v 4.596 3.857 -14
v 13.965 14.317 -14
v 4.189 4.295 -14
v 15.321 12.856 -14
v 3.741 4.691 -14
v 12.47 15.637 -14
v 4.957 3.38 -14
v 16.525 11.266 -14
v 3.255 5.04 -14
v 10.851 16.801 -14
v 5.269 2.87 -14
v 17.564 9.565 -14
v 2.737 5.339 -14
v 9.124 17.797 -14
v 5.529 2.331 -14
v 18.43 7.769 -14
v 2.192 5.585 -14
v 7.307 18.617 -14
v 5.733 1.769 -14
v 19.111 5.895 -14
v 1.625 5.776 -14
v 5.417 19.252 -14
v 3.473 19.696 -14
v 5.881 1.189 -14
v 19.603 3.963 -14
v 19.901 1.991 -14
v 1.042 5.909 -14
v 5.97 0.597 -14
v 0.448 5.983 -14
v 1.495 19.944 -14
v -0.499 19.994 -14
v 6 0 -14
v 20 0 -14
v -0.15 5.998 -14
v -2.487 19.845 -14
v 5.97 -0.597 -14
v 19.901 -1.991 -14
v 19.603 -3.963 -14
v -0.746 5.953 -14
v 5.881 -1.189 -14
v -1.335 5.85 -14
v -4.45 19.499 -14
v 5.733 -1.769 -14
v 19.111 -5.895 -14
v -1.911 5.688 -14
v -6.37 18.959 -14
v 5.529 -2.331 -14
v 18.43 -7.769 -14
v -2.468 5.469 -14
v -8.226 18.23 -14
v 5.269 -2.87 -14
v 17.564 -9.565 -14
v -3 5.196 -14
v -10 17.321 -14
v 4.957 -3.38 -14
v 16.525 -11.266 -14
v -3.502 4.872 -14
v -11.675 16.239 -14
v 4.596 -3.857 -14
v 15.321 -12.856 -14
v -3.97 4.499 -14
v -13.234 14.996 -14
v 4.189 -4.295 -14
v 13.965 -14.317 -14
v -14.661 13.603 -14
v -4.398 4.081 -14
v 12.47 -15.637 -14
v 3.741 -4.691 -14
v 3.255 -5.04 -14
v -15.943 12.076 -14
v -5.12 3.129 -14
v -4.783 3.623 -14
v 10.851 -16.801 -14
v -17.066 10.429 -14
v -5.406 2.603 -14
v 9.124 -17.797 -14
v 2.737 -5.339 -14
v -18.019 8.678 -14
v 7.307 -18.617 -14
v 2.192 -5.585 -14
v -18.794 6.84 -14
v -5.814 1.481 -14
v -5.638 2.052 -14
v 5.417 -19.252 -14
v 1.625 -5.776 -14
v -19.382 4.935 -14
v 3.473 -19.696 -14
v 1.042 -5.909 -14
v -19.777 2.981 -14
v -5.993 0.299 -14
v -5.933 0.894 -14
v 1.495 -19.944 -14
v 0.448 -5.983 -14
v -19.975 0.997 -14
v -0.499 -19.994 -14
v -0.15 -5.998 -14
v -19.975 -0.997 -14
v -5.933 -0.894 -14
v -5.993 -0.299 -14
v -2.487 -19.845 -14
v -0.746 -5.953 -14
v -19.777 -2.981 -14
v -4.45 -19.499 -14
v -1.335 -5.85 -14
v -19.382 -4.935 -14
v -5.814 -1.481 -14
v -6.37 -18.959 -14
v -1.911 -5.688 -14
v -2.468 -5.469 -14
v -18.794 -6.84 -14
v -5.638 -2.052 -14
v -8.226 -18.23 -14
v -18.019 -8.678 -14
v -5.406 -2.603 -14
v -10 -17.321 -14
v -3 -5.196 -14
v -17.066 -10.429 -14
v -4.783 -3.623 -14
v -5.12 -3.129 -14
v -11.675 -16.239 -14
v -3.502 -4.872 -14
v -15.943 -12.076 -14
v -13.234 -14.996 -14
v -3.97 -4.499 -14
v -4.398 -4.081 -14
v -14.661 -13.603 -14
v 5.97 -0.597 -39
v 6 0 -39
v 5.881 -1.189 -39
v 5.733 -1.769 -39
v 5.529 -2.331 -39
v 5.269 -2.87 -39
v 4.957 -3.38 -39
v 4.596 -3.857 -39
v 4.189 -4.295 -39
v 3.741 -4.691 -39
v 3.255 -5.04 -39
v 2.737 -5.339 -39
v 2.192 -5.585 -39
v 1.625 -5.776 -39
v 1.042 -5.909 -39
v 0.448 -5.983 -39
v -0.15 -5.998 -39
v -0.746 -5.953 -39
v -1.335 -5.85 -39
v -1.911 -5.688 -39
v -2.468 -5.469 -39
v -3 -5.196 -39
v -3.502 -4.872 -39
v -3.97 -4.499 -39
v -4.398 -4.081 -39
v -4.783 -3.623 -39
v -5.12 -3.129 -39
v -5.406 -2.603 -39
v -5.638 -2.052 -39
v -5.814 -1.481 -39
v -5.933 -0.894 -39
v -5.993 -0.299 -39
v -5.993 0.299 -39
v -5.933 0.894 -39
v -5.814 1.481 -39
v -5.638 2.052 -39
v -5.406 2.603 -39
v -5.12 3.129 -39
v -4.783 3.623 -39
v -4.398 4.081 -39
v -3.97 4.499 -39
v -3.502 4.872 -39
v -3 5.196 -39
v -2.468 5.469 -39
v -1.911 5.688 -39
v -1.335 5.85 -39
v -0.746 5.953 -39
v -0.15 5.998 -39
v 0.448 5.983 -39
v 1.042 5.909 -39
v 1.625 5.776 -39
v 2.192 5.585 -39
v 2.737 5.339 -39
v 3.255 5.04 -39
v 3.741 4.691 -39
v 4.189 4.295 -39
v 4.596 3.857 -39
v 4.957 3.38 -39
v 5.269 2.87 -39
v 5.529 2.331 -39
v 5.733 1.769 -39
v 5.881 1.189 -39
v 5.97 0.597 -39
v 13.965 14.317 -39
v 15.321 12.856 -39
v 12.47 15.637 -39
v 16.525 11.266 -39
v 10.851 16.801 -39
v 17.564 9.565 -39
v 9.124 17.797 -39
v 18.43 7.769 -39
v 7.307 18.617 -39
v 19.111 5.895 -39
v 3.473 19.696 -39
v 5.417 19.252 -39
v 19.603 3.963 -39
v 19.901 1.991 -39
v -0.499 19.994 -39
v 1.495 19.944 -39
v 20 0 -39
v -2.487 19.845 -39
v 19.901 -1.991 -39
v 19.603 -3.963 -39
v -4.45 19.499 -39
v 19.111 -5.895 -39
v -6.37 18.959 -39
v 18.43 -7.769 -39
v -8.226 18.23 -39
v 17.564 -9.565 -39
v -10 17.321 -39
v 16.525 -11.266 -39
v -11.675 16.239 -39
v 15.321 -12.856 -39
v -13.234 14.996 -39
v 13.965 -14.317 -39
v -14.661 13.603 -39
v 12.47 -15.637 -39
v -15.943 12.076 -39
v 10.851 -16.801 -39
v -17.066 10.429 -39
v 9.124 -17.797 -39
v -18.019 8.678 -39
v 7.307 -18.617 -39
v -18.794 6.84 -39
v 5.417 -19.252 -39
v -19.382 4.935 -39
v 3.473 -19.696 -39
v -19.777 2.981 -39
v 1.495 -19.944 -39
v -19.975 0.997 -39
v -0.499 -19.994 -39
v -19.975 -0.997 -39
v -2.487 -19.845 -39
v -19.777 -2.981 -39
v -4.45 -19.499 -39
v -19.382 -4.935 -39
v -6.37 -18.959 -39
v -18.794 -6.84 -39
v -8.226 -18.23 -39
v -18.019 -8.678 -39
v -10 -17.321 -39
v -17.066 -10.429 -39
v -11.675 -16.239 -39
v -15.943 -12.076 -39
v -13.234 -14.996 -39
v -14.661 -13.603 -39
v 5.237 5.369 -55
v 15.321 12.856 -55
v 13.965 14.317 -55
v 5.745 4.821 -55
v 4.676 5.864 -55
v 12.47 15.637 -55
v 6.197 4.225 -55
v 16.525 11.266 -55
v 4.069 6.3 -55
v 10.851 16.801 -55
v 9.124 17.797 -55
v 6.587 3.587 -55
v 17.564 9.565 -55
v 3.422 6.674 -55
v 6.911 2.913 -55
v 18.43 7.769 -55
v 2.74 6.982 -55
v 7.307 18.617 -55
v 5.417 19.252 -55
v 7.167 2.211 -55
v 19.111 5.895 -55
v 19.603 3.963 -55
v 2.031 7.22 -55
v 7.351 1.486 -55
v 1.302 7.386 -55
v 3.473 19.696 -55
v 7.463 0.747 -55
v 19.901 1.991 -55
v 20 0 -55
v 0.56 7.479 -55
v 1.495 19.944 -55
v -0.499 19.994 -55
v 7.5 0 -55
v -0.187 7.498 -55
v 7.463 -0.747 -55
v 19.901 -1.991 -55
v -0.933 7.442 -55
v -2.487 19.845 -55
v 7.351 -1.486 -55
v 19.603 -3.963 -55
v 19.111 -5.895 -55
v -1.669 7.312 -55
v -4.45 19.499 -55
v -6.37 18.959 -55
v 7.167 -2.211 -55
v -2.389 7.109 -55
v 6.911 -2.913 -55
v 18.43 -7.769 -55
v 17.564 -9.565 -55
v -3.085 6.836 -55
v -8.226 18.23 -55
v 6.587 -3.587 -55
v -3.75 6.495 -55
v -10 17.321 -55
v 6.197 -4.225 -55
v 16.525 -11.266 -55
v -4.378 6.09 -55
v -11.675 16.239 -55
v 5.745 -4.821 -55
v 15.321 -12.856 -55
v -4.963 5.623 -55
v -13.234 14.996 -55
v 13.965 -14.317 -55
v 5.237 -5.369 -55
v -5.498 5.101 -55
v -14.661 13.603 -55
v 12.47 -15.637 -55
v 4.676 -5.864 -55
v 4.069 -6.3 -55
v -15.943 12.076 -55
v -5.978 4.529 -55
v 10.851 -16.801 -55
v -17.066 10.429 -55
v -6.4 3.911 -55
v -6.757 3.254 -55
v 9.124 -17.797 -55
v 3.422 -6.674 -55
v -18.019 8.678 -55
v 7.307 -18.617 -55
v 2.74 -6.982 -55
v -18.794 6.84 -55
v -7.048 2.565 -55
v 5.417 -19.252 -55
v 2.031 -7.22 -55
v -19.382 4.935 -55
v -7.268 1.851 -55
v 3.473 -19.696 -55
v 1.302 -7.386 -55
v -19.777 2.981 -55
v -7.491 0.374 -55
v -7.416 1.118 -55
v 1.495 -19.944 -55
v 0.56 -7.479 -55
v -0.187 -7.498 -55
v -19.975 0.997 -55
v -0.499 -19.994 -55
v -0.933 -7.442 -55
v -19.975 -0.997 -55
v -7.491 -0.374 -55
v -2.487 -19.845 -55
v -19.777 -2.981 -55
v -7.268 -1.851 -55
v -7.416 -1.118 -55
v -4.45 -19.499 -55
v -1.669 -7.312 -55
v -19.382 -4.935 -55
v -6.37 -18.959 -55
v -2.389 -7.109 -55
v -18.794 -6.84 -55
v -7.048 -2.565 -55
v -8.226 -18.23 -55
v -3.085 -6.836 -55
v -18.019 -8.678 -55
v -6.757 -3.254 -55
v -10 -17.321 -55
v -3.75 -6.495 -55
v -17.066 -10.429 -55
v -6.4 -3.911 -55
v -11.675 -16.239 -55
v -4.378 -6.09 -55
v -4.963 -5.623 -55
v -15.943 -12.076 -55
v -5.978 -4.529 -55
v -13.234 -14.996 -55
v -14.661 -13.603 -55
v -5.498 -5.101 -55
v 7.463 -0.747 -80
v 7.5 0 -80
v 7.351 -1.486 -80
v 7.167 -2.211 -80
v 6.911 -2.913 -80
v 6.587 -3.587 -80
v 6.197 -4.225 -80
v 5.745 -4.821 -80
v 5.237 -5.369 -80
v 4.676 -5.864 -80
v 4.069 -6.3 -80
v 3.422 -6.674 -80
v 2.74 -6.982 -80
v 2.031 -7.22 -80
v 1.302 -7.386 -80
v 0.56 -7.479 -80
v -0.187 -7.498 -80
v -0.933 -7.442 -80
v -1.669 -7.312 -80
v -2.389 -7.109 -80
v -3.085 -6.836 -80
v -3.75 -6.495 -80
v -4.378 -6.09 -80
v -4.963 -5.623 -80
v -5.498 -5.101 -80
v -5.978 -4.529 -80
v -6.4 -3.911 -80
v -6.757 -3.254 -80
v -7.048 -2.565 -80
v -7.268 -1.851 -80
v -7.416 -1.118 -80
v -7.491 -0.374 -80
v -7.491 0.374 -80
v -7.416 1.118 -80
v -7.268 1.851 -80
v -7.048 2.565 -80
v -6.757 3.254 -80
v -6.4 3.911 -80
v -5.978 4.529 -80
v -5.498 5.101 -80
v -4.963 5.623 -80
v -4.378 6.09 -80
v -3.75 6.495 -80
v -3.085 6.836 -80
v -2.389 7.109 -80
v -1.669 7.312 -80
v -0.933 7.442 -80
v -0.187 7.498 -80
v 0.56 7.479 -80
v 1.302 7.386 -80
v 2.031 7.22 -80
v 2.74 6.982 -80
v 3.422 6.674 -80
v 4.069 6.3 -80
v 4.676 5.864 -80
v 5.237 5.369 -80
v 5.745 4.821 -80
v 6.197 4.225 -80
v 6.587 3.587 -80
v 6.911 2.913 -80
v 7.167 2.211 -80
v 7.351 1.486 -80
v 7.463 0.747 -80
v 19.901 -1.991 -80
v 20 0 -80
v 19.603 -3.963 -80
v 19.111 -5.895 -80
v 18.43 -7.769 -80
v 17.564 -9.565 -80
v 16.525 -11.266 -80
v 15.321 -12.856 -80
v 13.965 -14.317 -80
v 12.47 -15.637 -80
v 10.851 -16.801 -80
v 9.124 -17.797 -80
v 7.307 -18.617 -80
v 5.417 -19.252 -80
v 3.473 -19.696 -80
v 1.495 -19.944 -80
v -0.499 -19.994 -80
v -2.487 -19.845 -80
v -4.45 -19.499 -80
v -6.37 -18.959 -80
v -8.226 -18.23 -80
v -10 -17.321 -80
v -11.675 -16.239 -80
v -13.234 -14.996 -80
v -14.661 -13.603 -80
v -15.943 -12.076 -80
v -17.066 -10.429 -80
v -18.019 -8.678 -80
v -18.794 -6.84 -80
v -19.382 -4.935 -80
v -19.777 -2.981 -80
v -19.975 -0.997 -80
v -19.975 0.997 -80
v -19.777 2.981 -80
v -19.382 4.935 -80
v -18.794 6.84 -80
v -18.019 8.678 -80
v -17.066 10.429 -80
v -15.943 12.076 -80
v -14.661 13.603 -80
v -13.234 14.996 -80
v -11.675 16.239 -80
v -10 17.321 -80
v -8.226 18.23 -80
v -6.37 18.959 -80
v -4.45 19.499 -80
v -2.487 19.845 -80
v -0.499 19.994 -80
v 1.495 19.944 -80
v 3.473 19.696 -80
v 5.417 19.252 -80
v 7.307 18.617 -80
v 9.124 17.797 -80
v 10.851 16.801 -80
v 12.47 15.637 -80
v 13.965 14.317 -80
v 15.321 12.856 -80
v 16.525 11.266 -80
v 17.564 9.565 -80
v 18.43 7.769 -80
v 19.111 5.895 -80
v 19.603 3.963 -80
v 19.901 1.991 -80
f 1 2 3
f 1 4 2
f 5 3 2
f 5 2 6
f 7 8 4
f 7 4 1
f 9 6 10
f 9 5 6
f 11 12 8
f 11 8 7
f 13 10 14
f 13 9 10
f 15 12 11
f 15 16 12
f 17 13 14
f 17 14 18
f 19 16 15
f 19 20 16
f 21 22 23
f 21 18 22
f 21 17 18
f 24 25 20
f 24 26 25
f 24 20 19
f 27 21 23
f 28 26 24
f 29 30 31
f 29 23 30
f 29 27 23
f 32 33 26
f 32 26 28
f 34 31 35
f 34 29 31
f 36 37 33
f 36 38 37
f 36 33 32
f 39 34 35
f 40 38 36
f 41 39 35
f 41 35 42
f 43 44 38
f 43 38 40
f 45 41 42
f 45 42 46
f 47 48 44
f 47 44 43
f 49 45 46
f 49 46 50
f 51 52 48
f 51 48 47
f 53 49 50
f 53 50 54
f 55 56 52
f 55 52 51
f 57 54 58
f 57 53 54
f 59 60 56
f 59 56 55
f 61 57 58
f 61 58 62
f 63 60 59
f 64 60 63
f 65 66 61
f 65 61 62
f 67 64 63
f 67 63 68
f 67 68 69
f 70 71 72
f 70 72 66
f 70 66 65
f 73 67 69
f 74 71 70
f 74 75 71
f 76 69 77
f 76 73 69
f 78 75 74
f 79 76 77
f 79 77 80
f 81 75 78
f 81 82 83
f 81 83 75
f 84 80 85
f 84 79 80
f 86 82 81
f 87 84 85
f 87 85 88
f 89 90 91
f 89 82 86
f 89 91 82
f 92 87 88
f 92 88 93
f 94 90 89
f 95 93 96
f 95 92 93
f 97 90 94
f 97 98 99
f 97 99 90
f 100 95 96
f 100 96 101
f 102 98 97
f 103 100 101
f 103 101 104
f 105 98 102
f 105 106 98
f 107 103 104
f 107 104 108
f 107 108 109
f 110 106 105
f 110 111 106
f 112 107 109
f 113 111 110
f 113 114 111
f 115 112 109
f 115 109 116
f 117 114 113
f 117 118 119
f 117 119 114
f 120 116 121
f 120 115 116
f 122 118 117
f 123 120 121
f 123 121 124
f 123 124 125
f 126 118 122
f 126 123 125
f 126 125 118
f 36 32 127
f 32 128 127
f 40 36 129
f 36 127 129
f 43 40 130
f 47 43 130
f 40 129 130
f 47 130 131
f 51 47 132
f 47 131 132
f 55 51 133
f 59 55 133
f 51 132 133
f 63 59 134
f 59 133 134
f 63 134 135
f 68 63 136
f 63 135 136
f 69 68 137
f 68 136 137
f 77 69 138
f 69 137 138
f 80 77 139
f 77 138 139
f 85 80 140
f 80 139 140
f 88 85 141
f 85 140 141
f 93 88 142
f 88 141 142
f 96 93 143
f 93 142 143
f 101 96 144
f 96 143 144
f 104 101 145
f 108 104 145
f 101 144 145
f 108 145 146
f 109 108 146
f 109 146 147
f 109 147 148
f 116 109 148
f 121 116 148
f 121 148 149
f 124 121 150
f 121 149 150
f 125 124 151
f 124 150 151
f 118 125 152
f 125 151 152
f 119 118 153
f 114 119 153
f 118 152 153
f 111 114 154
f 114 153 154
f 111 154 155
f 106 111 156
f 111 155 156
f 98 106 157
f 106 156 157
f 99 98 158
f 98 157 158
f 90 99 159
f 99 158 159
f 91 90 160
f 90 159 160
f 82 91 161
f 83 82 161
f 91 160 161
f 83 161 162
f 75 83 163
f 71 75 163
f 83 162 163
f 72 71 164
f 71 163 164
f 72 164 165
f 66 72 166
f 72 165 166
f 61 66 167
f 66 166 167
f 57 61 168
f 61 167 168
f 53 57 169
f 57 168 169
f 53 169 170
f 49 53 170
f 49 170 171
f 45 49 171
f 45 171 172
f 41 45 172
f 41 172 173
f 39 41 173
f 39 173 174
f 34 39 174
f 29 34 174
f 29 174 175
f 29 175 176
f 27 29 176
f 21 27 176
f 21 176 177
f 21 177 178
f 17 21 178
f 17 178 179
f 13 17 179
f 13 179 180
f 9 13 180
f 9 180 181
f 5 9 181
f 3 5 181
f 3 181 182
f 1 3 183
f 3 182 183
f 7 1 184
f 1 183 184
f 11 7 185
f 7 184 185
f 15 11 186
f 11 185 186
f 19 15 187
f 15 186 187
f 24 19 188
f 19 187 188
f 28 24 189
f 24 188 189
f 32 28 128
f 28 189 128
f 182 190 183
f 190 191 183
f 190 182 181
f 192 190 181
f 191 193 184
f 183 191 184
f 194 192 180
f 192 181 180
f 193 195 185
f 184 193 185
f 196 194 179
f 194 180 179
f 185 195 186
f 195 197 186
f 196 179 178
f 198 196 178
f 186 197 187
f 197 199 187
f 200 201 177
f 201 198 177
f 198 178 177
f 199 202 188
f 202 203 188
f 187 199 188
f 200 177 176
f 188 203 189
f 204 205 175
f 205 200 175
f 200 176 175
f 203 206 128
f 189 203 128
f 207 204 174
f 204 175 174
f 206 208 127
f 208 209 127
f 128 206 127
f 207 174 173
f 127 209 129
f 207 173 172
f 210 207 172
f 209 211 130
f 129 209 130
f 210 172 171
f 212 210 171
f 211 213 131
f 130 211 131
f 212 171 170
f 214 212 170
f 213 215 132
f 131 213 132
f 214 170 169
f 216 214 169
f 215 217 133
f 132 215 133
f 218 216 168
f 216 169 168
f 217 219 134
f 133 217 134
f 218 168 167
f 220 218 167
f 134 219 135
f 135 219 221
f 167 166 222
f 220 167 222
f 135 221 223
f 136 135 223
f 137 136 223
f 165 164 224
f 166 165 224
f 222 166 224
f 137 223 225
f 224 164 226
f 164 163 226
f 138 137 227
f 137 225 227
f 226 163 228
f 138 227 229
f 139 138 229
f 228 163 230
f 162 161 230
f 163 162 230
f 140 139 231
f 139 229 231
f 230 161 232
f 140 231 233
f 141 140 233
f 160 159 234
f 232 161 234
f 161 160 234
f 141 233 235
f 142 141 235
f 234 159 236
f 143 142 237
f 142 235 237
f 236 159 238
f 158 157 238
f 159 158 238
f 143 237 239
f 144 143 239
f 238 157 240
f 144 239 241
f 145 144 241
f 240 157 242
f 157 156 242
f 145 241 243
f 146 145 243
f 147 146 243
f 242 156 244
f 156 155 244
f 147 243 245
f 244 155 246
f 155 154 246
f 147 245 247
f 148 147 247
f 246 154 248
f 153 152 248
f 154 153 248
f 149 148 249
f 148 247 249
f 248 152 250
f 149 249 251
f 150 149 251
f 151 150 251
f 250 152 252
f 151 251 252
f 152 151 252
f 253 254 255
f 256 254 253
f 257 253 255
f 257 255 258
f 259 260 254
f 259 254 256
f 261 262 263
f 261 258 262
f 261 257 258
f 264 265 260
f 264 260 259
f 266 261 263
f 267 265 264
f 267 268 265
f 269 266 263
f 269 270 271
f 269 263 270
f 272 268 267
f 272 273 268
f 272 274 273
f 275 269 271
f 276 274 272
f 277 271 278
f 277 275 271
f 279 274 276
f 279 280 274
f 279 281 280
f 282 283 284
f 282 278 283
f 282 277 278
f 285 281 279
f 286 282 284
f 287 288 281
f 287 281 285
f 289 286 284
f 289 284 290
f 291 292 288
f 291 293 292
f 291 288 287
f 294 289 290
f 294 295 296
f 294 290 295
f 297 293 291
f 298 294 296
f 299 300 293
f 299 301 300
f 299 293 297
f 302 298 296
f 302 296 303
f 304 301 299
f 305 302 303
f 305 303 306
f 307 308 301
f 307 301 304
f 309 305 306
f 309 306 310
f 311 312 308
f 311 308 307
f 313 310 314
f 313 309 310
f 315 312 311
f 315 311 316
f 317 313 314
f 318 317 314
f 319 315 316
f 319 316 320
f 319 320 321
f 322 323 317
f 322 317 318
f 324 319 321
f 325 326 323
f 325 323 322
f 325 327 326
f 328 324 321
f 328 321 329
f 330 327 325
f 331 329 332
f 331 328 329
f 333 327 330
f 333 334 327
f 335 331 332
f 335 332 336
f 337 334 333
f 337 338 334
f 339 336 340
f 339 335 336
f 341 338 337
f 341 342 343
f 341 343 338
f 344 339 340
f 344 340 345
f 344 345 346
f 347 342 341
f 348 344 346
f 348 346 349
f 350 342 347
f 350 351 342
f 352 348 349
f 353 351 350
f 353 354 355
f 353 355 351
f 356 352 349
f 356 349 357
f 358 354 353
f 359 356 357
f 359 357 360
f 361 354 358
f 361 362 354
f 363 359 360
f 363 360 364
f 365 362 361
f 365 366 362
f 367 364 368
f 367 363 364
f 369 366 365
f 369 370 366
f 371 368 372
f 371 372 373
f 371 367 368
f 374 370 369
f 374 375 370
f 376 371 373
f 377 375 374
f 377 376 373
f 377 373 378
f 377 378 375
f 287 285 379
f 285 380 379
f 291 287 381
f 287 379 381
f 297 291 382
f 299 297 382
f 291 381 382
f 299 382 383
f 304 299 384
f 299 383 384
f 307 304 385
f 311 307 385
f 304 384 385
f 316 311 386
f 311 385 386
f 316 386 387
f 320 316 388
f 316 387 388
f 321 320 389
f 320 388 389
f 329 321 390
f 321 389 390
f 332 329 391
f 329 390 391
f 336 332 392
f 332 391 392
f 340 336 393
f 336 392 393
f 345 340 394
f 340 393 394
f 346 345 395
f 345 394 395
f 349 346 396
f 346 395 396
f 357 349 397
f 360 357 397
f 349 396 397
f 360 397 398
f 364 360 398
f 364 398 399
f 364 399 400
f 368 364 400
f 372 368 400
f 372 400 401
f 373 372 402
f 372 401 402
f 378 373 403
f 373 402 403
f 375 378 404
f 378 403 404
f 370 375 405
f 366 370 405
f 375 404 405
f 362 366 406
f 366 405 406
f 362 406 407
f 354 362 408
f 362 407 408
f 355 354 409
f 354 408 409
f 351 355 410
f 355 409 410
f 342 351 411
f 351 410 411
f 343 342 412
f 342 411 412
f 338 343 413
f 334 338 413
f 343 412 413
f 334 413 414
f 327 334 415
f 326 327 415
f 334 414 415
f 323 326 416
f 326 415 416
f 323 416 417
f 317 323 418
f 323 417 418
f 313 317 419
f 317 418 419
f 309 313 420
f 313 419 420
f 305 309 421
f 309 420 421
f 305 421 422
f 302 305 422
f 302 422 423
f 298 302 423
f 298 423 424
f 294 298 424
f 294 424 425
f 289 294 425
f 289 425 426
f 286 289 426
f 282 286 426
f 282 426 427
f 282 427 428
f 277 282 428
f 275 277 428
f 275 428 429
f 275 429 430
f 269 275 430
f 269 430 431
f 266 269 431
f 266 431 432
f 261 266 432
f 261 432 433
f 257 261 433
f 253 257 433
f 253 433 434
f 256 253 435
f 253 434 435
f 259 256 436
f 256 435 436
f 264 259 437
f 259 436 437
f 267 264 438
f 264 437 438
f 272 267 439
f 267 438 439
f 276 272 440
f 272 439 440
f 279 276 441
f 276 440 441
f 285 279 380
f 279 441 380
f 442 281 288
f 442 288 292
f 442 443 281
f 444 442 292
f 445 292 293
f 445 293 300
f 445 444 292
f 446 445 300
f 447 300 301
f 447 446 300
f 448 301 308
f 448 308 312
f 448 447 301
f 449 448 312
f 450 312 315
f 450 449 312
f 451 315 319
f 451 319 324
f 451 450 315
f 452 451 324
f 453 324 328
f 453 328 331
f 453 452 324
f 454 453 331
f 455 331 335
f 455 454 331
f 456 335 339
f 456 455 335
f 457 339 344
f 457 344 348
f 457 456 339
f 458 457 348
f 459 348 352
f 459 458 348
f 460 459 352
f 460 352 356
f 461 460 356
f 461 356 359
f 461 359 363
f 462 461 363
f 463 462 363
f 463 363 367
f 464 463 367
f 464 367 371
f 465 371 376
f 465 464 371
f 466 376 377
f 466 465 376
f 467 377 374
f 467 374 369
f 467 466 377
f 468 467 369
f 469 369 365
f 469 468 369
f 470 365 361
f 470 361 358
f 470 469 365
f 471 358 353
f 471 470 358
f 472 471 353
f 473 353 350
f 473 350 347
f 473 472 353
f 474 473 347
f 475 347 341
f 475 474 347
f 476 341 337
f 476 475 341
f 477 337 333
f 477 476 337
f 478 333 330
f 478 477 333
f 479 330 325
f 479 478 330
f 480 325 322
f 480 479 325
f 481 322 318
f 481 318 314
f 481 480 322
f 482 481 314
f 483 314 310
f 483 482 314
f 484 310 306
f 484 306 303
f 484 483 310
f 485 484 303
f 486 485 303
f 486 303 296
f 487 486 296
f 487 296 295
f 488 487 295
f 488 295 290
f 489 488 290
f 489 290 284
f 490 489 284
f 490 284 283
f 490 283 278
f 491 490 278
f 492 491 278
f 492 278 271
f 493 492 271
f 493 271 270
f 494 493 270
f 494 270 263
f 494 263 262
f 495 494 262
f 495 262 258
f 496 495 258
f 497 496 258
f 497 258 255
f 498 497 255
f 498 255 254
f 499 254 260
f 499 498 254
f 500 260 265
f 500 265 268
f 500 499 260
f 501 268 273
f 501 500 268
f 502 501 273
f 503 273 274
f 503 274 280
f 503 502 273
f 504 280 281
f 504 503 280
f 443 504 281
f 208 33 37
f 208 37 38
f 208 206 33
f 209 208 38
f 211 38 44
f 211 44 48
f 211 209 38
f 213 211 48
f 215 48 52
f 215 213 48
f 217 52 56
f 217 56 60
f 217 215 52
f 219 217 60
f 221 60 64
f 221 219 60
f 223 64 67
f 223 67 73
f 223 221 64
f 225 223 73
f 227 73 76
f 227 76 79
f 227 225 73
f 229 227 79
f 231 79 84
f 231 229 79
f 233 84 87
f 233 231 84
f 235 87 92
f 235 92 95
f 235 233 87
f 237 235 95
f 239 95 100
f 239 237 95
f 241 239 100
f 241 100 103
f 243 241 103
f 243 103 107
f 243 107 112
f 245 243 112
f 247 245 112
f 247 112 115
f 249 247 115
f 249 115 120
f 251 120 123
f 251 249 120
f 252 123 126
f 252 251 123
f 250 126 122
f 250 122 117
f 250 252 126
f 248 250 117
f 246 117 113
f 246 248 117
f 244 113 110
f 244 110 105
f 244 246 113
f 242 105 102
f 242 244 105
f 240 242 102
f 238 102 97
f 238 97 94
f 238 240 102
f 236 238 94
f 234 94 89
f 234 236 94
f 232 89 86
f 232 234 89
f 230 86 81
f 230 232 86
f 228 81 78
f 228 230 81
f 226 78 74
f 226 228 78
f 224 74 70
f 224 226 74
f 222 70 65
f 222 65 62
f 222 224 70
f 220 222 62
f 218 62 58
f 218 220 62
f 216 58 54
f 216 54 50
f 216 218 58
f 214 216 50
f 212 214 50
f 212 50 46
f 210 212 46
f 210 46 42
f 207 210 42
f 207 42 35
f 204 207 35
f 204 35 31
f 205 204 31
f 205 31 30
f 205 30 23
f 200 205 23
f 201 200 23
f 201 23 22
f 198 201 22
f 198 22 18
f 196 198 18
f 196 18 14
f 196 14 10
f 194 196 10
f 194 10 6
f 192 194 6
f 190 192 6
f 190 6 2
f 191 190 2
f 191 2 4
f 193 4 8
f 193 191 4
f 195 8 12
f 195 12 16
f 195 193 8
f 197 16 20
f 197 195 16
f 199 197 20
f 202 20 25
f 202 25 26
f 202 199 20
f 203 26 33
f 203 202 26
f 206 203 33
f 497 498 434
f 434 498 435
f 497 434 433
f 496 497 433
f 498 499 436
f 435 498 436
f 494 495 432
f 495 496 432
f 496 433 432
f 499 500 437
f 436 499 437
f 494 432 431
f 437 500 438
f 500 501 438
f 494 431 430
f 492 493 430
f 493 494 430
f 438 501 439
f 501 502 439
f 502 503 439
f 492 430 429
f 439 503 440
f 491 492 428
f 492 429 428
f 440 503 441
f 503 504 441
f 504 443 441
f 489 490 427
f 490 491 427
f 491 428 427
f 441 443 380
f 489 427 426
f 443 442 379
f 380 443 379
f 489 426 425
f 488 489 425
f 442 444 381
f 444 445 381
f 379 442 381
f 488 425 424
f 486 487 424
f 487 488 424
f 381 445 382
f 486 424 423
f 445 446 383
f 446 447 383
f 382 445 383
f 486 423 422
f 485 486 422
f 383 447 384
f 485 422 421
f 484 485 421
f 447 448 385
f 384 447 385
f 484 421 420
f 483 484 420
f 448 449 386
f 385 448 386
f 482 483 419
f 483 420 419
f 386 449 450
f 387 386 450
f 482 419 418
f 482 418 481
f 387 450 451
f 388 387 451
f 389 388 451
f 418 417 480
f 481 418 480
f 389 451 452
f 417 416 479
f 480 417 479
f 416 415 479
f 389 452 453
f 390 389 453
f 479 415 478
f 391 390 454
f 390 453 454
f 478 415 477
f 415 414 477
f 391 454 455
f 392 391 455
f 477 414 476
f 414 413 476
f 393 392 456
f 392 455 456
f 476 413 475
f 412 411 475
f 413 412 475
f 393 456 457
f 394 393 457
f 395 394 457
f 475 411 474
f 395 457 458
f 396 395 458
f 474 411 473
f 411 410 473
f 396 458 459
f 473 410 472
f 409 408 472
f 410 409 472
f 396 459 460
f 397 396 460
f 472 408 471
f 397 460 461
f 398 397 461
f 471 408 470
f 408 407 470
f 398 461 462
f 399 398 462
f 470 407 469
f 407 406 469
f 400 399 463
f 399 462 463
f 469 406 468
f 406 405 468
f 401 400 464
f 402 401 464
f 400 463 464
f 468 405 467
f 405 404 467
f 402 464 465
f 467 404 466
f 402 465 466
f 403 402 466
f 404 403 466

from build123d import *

# Parameters (mm, degrees)
SKETCH_1_W   = 25
SKETCH_1_H   = 14
SKETCH_1_H_2 = 12.5


with BuildPart() as part:
    # 草图1 → 旋转1 (revolve)
    with BuildSketch(Plane(origin=(0, 0, 0), x_dir=(0, 0, -1), z_dir=(1, 0, 0)), mode=Mode.PRIVATE) as revolve_1_sk:
        with Locations((26.5, 13)):
            Rectangle(SKETCH_1_W, SKETCH_1_H)
        with Locations((67.5, 13.75)):
            Rectangle(SKETCH_1_W, SKETCH_1_H_2)
    revolve(revolve_1_sk.sketch.rotate(Axis((0, 0, -9), (0, 0, -1)), 90), axis=Axis((0, 0, -9), (0, 0, -1)))


solid = part.part
